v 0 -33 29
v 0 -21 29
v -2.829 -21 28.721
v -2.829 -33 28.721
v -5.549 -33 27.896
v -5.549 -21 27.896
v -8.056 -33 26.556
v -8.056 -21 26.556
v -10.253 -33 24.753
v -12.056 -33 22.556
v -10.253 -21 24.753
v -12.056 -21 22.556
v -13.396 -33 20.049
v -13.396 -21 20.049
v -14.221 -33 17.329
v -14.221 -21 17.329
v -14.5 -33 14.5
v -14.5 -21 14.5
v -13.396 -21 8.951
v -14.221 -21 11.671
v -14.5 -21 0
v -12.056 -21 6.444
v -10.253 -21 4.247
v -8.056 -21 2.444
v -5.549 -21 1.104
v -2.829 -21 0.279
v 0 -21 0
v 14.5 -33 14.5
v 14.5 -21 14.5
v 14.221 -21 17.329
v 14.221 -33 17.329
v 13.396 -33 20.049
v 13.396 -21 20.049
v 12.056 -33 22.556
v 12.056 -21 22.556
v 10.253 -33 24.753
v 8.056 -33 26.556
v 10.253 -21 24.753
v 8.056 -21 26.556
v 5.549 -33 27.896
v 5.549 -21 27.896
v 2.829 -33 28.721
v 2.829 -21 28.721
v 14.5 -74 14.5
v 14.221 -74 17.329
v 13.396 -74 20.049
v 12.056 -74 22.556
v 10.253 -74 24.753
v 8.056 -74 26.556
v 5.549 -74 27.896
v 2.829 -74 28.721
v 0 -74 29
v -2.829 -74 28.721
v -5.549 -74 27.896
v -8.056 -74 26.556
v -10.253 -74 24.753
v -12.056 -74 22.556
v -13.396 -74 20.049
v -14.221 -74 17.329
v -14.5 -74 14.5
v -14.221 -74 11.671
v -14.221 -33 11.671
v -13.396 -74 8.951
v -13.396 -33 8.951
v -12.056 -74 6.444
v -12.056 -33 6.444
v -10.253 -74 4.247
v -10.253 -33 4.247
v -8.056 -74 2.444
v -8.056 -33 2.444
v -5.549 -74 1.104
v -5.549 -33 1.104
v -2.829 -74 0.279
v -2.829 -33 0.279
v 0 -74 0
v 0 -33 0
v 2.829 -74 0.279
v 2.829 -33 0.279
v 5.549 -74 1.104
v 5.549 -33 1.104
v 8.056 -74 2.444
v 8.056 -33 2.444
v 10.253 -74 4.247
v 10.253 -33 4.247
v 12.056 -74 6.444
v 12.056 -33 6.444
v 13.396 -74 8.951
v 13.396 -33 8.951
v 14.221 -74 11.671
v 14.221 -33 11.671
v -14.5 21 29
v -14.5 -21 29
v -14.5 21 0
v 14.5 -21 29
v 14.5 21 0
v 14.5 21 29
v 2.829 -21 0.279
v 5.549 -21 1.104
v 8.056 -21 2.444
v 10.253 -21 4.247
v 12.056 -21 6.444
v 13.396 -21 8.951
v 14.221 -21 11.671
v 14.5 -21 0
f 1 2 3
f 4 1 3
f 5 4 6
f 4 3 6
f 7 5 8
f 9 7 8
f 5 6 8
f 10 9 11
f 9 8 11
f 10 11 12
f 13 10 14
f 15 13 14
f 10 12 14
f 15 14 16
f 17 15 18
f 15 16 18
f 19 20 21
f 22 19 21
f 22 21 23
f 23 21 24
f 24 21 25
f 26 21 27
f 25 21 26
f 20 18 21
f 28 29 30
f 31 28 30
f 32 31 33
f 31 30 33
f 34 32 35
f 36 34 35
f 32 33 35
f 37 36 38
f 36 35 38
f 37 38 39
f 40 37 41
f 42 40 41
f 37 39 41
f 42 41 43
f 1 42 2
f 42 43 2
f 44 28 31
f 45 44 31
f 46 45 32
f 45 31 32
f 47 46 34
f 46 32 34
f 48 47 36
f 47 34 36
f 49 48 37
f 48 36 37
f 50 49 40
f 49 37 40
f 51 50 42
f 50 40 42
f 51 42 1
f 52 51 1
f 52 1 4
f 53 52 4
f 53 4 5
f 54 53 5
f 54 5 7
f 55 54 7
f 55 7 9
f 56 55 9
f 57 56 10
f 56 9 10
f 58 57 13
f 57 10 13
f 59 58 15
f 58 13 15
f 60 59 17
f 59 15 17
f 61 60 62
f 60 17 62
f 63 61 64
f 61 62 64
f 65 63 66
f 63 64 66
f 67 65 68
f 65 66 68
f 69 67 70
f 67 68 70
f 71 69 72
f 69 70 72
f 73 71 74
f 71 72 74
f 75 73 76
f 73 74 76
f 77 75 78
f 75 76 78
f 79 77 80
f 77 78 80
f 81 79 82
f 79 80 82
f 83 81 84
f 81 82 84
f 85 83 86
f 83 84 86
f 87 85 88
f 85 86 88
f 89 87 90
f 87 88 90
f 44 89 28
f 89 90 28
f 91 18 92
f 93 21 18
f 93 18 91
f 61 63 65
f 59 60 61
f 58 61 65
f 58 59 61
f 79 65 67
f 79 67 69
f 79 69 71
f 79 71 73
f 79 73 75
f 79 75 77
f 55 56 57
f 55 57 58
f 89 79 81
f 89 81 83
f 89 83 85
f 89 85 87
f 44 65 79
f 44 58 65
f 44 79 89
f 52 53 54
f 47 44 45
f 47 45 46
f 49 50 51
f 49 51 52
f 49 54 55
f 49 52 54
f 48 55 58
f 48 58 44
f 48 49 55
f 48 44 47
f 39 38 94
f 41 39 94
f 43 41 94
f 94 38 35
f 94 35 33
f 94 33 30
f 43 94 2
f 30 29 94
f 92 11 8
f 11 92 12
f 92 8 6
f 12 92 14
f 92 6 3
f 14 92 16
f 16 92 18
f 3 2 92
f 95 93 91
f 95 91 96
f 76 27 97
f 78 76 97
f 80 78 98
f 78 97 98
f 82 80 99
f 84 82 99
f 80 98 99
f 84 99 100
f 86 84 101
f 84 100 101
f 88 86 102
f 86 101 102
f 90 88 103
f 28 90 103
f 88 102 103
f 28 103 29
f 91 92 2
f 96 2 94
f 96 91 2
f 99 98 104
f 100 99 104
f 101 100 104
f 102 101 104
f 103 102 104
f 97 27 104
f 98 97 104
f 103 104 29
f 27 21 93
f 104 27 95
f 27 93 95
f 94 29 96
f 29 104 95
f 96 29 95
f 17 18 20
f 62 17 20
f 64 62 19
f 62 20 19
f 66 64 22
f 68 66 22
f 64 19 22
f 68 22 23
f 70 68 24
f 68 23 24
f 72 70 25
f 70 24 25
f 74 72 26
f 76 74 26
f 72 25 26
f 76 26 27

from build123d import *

# Parameters (mm, degrees)
F0_W     = 29
F0_H     = 42
F1_DEPTH = 29
F3_DEPTH = 12
F4_R     = 14.5
F5_DEPTH = 41


# Not quite as in the source:
# - the program builds the solid bodies; features that only make, move or delete a surface that nothing else refers to are left out


with BuildPart() as f1:
    # F0 (on Top) → F1 (new body)
    with BuildSketch(Plane.XY):
        Rectangle(F0_W, F0_H)
    extrude(amount=F1_DEPTH)

    # F2 (on face) → F3 (join)
    with BuildSketch(Plane.XZ.offset(21)):
        with BuildLine():
            ThreePointArc((0, 0), (10.2530483272, 4.2469516728), (14.5, 14.5))
            ThreePointArc((14.5, 14.5), (10.2530483272, 24.7530483272), (0, 29))
            ThreePointArc((0, 29), (-10.2530483272, 24.7530483272), (-14.5, 14.5))
            ThreePointArc((-14.5, 14.5), (-10.2530483272, 4.2469516728), (0, 0))
        make_face()
    extrude(amount=F3_DEPTH)

    # F4 (on face) → F5 (join)
    with BuildSketch(Plane.XZ.offset(33)):
        with Locations((0, 14.5)):
            Circle(F4_R)
    extrude(amount=F5_DEPTH)


solid = f1.part
